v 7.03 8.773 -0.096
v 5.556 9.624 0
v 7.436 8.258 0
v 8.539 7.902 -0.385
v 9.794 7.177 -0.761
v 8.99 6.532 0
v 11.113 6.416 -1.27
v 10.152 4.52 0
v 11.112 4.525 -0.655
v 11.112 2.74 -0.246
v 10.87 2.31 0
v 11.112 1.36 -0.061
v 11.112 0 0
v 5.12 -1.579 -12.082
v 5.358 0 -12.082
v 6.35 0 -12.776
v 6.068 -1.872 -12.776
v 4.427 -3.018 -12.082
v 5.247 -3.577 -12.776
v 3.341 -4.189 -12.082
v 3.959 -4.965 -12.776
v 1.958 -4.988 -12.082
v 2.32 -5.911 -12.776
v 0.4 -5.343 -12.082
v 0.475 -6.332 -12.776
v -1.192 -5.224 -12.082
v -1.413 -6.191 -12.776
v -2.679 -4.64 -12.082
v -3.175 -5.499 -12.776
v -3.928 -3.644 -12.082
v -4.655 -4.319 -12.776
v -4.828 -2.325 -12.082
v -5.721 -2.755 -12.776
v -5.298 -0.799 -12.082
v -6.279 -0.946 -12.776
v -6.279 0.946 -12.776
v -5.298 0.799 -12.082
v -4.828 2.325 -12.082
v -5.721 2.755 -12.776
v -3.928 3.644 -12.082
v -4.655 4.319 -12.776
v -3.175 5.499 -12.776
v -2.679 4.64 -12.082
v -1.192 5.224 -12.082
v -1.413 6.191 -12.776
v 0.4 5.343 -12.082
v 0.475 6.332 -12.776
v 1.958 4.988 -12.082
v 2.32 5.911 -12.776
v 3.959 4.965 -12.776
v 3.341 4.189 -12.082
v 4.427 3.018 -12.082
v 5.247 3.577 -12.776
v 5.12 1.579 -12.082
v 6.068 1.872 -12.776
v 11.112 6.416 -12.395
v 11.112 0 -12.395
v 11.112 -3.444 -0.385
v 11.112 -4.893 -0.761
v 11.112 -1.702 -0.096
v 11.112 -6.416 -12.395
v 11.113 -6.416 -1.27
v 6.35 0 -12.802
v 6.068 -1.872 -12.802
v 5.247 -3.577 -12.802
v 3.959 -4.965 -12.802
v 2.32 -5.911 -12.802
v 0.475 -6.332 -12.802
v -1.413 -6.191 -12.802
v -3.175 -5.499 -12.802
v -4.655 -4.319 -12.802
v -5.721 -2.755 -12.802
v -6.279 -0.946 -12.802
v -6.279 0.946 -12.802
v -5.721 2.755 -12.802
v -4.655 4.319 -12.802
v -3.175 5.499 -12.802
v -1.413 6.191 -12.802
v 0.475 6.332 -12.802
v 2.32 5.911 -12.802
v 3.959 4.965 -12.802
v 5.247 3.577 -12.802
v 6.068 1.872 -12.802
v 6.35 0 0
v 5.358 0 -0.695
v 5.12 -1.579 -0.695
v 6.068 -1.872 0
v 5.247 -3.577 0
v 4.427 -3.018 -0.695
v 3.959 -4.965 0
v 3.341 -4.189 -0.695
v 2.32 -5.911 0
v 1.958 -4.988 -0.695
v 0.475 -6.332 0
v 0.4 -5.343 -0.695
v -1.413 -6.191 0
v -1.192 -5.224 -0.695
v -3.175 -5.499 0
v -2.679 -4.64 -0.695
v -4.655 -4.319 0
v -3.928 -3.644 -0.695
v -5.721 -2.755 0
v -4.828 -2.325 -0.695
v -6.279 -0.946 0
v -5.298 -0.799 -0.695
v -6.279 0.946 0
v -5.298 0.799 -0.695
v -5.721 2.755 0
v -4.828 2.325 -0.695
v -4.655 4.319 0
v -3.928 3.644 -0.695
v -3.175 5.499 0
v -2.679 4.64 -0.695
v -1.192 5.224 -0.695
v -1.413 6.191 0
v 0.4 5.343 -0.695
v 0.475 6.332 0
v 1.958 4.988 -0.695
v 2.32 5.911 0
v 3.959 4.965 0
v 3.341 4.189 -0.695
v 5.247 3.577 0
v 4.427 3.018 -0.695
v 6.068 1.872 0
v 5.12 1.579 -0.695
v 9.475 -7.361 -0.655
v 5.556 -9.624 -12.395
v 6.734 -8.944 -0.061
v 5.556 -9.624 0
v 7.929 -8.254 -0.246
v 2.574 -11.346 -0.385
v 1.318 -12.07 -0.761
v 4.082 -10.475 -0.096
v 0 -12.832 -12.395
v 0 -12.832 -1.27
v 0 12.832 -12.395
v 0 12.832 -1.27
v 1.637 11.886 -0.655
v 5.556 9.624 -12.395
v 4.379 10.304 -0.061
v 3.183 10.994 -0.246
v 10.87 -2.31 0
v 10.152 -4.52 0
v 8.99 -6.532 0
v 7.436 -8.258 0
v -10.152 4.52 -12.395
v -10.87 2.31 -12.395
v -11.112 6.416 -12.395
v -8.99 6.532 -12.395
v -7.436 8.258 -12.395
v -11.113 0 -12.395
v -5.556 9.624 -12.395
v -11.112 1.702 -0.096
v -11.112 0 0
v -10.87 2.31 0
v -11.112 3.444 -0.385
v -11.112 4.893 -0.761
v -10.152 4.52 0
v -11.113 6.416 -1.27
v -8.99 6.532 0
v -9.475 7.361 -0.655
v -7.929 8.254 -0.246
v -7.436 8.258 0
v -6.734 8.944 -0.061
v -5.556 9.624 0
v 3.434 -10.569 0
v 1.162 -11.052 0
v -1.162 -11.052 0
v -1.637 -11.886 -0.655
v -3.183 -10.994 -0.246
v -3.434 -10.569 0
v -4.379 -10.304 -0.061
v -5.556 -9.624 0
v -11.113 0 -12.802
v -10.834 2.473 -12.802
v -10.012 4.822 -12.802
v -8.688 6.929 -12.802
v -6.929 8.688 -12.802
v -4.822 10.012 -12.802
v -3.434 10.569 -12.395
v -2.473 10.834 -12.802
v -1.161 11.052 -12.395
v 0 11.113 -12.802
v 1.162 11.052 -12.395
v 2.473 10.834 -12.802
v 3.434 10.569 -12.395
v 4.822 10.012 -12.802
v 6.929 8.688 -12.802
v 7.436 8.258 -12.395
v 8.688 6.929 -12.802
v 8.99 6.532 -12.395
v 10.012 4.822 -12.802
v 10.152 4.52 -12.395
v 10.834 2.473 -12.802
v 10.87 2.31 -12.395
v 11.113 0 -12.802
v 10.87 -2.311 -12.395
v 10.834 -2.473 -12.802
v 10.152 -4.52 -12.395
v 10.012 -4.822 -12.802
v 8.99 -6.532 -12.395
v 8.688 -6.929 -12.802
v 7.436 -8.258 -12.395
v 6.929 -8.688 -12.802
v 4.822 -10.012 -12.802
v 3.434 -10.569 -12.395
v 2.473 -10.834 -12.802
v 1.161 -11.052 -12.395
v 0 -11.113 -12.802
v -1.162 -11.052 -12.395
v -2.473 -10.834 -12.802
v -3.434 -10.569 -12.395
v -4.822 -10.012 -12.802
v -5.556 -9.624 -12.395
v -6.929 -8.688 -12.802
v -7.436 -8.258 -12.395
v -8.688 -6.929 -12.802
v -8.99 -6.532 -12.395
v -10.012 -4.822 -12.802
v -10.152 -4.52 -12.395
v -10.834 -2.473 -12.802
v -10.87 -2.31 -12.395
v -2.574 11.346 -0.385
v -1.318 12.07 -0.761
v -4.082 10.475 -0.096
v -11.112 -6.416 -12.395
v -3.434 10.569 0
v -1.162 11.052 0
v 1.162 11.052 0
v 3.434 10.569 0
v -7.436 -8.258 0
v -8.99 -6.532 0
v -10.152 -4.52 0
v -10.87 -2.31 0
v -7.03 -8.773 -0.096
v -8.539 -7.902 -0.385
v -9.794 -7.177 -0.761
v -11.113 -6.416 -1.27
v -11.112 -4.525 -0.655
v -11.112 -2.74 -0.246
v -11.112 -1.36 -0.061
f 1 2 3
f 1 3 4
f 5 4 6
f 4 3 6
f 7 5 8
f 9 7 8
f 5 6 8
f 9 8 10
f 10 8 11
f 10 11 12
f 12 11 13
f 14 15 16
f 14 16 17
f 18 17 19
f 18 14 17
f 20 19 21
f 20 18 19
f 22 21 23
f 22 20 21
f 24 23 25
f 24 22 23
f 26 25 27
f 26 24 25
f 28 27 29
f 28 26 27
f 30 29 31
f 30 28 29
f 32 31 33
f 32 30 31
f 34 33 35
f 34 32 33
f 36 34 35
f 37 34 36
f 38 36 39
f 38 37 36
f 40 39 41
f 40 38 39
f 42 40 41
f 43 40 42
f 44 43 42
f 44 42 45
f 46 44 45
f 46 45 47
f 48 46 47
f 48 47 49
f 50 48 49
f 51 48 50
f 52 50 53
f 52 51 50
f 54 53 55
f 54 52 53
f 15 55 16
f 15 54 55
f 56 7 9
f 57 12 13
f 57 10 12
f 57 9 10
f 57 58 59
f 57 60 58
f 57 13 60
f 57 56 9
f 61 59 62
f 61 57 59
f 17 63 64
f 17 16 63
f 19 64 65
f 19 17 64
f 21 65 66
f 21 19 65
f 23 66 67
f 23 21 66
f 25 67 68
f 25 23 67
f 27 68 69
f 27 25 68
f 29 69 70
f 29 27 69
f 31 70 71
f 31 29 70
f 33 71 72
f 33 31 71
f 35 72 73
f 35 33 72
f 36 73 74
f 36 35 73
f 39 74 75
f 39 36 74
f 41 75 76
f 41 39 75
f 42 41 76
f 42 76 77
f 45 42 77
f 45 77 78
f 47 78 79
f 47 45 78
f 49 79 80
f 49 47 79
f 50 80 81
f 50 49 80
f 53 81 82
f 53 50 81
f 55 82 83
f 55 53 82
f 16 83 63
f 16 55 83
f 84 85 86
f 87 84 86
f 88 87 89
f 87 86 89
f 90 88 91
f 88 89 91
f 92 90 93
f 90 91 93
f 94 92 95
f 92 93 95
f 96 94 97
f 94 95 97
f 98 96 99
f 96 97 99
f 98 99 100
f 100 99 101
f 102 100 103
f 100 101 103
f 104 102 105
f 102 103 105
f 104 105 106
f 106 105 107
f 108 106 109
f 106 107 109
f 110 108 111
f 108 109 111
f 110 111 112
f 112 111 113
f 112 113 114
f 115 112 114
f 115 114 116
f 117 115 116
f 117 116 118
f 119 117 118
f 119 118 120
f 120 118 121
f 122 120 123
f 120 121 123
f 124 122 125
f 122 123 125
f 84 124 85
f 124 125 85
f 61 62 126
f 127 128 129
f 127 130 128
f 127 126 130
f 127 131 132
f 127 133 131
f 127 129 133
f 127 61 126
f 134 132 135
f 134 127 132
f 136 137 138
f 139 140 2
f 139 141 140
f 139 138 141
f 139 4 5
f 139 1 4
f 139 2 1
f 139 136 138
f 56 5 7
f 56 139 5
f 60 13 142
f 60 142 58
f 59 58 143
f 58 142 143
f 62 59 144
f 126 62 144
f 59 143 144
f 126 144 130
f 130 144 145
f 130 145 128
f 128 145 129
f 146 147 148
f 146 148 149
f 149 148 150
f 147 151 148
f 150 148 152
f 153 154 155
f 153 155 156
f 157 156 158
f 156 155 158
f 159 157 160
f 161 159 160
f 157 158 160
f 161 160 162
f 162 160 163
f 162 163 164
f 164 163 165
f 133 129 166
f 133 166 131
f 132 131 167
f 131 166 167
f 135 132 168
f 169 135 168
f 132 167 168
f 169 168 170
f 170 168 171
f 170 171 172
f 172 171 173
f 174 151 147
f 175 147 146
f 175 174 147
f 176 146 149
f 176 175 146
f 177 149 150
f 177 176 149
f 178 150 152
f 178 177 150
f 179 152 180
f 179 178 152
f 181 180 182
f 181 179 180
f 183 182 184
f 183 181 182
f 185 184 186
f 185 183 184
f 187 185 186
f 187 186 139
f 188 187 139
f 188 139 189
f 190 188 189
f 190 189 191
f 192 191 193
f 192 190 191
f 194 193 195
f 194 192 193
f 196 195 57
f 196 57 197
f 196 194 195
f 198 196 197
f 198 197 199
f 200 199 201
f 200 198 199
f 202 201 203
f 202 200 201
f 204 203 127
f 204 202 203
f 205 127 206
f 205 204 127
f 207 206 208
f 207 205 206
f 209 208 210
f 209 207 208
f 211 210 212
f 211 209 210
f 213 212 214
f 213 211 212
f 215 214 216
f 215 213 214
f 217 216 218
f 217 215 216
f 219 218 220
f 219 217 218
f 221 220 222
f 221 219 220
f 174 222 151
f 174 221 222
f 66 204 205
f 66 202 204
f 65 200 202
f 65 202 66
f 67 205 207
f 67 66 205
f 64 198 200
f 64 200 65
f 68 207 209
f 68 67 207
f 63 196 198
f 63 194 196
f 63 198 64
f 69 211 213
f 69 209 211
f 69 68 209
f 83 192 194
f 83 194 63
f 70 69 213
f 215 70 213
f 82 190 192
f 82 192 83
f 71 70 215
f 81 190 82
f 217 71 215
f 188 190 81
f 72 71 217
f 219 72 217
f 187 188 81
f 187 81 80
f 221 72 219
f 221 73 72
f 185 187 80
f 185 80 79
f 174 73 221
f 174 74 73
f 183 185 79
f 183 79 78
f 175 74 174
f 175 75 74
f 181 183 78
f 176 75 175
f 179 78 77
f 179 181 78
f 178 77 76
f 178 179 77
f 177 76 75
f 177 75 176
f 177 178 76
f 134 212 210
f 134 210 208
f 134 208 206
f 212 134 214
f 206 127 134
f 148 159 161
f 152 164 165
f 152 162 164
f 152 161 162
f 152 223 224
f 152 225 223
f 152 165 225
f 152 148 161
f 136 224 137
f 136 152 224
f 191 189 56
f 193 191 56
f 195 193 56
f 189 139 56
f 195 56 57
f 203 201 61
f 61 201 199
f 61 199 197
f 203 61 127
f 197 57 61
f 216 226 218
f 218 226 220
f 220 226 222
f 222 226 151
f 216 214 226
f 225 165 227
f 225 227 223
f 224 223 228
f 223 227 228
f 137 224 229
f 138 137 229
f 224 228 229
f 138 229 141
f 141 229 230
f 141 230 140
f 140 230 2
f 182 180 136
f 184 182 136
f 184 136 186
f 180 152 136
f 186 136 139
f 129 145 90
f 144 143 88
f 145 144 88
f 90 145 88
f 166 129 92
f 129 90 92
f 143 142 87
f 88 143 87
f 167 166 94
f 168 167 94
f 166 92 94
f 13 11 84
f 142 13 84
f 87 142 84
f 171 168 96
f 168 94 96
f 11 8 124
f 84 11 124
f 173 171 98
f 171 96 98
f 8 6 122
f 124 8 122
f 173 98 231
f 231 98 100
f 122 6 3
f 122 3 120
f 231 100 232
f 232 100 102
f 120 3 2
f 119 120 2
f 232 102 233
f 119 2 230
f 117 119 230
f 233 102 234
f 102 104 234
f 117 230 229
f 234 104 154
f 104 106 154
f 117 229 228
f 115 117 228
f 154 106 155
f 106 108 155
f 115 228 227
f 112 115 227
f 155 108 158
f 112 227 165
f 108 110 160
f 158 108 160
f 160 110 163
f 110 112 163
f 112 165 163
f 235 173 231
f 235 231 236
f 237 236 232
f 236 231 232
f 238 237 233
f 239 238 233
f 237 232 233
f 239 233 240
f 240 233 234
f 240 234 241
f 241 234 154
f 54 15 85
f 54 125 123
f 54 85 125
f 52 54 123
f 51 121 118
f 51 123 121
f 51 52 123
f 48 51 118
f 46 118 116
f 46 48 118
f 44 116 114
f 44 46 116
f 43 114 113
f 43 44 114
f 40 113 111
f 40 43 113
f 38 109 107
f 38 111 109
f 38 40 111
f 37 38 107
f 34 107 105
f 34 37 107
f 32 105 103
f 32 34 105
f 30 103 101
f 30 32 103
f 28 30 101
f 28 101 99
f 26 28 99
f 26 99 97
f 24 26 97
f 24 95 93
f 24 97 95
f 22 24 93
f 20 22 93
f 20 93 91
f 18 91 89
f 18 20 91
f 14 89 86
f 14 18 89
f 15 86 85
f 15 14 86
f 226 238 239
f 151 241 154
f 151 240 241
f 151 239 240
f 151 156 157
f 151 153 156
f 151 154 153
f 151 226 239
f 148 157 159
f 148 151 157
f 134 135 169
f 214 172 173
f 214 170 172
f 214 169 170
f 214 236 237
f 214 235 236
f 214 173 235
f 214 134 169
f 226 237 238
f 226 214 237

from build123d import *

# Parameters (mm, degrees)
BASENUT_START = -12.8016
BASENUTSKE_R  = 5.35813
BASENUT_DEPTH = 12.8016
SKETCH4_W     = 0.4064
SKETCH4_H     = 14.419109733


with BuildPart() as part:
    # BaseNutSke → BaseNut (new body)
    with BuildSketch(Plane.XY.offset(BASENUT_START)):
        Polygon((11.1125, 6.415804866), (11.1125, -6.415804866), (0, -12.831609733), (-11.1125, -6.415804866), (-11.1125, 6.415804866), (0, 12.831609733), align=None)
        Circle(BASENUTSKE_R, mode=Mode.SUBTRACT)
    extrude(amount=BASENUT_DEPTH)

    # Sketch4 → Bearing-Face (revolve, cut)
    with BuildSketch(Plane(origin=(0, 0, 0), x_dir=(0, 0, -1), z_dir=(1, 0, 0)), mode=Mode.PRIVATE) as bearing_face_sk:
        with Locations((12.5984, 18.322054867)):
            Rectangle(SKETCH4_W, SKETCH4_H)
        Polygon((0, 11.1125), (-12.7, 11.1125), (-12.7, 25.531609733), (1.27, 25.531609733), (1.27, 12.831609733), align=None)
    revolve(bearing_face_sk.sketch.rotate(Axis((0, 0, 0), (0, 0, -1)), 270), axis=Axis((0, 0, 0), (0, 0, -1)), mode=Mode.SUBTRACT)

    # Sketch5 → EndChamfer (revolve, cut)
    with BuildSketch(Plane(origin=(0, 0, 0), x_dir=(0, 0, -1), z_dir=(1, 0, 0)), mode=Mode.PRIVATE) as endchamfer_sk:
        Polygon((12.7762, 6.35), (12.012233664, 5.258943), (12.827, 5.258943), (12.827, 6.35), align=None)
        Polygon((-0.0508, 6.35), (0, 6.35), (0.763966336, 5.258943), (-0.0508, 5.258943), align=None)
    revolve(endchamfer_sk.sketch.rotate(Axis((0, 0, -25.037505729), (0, 0, -1)), 90), axis=Axis((0, 0, -25.037505729), (0, 0, -1)), mode=Mode.SUBTRACT)


solid = part.part
